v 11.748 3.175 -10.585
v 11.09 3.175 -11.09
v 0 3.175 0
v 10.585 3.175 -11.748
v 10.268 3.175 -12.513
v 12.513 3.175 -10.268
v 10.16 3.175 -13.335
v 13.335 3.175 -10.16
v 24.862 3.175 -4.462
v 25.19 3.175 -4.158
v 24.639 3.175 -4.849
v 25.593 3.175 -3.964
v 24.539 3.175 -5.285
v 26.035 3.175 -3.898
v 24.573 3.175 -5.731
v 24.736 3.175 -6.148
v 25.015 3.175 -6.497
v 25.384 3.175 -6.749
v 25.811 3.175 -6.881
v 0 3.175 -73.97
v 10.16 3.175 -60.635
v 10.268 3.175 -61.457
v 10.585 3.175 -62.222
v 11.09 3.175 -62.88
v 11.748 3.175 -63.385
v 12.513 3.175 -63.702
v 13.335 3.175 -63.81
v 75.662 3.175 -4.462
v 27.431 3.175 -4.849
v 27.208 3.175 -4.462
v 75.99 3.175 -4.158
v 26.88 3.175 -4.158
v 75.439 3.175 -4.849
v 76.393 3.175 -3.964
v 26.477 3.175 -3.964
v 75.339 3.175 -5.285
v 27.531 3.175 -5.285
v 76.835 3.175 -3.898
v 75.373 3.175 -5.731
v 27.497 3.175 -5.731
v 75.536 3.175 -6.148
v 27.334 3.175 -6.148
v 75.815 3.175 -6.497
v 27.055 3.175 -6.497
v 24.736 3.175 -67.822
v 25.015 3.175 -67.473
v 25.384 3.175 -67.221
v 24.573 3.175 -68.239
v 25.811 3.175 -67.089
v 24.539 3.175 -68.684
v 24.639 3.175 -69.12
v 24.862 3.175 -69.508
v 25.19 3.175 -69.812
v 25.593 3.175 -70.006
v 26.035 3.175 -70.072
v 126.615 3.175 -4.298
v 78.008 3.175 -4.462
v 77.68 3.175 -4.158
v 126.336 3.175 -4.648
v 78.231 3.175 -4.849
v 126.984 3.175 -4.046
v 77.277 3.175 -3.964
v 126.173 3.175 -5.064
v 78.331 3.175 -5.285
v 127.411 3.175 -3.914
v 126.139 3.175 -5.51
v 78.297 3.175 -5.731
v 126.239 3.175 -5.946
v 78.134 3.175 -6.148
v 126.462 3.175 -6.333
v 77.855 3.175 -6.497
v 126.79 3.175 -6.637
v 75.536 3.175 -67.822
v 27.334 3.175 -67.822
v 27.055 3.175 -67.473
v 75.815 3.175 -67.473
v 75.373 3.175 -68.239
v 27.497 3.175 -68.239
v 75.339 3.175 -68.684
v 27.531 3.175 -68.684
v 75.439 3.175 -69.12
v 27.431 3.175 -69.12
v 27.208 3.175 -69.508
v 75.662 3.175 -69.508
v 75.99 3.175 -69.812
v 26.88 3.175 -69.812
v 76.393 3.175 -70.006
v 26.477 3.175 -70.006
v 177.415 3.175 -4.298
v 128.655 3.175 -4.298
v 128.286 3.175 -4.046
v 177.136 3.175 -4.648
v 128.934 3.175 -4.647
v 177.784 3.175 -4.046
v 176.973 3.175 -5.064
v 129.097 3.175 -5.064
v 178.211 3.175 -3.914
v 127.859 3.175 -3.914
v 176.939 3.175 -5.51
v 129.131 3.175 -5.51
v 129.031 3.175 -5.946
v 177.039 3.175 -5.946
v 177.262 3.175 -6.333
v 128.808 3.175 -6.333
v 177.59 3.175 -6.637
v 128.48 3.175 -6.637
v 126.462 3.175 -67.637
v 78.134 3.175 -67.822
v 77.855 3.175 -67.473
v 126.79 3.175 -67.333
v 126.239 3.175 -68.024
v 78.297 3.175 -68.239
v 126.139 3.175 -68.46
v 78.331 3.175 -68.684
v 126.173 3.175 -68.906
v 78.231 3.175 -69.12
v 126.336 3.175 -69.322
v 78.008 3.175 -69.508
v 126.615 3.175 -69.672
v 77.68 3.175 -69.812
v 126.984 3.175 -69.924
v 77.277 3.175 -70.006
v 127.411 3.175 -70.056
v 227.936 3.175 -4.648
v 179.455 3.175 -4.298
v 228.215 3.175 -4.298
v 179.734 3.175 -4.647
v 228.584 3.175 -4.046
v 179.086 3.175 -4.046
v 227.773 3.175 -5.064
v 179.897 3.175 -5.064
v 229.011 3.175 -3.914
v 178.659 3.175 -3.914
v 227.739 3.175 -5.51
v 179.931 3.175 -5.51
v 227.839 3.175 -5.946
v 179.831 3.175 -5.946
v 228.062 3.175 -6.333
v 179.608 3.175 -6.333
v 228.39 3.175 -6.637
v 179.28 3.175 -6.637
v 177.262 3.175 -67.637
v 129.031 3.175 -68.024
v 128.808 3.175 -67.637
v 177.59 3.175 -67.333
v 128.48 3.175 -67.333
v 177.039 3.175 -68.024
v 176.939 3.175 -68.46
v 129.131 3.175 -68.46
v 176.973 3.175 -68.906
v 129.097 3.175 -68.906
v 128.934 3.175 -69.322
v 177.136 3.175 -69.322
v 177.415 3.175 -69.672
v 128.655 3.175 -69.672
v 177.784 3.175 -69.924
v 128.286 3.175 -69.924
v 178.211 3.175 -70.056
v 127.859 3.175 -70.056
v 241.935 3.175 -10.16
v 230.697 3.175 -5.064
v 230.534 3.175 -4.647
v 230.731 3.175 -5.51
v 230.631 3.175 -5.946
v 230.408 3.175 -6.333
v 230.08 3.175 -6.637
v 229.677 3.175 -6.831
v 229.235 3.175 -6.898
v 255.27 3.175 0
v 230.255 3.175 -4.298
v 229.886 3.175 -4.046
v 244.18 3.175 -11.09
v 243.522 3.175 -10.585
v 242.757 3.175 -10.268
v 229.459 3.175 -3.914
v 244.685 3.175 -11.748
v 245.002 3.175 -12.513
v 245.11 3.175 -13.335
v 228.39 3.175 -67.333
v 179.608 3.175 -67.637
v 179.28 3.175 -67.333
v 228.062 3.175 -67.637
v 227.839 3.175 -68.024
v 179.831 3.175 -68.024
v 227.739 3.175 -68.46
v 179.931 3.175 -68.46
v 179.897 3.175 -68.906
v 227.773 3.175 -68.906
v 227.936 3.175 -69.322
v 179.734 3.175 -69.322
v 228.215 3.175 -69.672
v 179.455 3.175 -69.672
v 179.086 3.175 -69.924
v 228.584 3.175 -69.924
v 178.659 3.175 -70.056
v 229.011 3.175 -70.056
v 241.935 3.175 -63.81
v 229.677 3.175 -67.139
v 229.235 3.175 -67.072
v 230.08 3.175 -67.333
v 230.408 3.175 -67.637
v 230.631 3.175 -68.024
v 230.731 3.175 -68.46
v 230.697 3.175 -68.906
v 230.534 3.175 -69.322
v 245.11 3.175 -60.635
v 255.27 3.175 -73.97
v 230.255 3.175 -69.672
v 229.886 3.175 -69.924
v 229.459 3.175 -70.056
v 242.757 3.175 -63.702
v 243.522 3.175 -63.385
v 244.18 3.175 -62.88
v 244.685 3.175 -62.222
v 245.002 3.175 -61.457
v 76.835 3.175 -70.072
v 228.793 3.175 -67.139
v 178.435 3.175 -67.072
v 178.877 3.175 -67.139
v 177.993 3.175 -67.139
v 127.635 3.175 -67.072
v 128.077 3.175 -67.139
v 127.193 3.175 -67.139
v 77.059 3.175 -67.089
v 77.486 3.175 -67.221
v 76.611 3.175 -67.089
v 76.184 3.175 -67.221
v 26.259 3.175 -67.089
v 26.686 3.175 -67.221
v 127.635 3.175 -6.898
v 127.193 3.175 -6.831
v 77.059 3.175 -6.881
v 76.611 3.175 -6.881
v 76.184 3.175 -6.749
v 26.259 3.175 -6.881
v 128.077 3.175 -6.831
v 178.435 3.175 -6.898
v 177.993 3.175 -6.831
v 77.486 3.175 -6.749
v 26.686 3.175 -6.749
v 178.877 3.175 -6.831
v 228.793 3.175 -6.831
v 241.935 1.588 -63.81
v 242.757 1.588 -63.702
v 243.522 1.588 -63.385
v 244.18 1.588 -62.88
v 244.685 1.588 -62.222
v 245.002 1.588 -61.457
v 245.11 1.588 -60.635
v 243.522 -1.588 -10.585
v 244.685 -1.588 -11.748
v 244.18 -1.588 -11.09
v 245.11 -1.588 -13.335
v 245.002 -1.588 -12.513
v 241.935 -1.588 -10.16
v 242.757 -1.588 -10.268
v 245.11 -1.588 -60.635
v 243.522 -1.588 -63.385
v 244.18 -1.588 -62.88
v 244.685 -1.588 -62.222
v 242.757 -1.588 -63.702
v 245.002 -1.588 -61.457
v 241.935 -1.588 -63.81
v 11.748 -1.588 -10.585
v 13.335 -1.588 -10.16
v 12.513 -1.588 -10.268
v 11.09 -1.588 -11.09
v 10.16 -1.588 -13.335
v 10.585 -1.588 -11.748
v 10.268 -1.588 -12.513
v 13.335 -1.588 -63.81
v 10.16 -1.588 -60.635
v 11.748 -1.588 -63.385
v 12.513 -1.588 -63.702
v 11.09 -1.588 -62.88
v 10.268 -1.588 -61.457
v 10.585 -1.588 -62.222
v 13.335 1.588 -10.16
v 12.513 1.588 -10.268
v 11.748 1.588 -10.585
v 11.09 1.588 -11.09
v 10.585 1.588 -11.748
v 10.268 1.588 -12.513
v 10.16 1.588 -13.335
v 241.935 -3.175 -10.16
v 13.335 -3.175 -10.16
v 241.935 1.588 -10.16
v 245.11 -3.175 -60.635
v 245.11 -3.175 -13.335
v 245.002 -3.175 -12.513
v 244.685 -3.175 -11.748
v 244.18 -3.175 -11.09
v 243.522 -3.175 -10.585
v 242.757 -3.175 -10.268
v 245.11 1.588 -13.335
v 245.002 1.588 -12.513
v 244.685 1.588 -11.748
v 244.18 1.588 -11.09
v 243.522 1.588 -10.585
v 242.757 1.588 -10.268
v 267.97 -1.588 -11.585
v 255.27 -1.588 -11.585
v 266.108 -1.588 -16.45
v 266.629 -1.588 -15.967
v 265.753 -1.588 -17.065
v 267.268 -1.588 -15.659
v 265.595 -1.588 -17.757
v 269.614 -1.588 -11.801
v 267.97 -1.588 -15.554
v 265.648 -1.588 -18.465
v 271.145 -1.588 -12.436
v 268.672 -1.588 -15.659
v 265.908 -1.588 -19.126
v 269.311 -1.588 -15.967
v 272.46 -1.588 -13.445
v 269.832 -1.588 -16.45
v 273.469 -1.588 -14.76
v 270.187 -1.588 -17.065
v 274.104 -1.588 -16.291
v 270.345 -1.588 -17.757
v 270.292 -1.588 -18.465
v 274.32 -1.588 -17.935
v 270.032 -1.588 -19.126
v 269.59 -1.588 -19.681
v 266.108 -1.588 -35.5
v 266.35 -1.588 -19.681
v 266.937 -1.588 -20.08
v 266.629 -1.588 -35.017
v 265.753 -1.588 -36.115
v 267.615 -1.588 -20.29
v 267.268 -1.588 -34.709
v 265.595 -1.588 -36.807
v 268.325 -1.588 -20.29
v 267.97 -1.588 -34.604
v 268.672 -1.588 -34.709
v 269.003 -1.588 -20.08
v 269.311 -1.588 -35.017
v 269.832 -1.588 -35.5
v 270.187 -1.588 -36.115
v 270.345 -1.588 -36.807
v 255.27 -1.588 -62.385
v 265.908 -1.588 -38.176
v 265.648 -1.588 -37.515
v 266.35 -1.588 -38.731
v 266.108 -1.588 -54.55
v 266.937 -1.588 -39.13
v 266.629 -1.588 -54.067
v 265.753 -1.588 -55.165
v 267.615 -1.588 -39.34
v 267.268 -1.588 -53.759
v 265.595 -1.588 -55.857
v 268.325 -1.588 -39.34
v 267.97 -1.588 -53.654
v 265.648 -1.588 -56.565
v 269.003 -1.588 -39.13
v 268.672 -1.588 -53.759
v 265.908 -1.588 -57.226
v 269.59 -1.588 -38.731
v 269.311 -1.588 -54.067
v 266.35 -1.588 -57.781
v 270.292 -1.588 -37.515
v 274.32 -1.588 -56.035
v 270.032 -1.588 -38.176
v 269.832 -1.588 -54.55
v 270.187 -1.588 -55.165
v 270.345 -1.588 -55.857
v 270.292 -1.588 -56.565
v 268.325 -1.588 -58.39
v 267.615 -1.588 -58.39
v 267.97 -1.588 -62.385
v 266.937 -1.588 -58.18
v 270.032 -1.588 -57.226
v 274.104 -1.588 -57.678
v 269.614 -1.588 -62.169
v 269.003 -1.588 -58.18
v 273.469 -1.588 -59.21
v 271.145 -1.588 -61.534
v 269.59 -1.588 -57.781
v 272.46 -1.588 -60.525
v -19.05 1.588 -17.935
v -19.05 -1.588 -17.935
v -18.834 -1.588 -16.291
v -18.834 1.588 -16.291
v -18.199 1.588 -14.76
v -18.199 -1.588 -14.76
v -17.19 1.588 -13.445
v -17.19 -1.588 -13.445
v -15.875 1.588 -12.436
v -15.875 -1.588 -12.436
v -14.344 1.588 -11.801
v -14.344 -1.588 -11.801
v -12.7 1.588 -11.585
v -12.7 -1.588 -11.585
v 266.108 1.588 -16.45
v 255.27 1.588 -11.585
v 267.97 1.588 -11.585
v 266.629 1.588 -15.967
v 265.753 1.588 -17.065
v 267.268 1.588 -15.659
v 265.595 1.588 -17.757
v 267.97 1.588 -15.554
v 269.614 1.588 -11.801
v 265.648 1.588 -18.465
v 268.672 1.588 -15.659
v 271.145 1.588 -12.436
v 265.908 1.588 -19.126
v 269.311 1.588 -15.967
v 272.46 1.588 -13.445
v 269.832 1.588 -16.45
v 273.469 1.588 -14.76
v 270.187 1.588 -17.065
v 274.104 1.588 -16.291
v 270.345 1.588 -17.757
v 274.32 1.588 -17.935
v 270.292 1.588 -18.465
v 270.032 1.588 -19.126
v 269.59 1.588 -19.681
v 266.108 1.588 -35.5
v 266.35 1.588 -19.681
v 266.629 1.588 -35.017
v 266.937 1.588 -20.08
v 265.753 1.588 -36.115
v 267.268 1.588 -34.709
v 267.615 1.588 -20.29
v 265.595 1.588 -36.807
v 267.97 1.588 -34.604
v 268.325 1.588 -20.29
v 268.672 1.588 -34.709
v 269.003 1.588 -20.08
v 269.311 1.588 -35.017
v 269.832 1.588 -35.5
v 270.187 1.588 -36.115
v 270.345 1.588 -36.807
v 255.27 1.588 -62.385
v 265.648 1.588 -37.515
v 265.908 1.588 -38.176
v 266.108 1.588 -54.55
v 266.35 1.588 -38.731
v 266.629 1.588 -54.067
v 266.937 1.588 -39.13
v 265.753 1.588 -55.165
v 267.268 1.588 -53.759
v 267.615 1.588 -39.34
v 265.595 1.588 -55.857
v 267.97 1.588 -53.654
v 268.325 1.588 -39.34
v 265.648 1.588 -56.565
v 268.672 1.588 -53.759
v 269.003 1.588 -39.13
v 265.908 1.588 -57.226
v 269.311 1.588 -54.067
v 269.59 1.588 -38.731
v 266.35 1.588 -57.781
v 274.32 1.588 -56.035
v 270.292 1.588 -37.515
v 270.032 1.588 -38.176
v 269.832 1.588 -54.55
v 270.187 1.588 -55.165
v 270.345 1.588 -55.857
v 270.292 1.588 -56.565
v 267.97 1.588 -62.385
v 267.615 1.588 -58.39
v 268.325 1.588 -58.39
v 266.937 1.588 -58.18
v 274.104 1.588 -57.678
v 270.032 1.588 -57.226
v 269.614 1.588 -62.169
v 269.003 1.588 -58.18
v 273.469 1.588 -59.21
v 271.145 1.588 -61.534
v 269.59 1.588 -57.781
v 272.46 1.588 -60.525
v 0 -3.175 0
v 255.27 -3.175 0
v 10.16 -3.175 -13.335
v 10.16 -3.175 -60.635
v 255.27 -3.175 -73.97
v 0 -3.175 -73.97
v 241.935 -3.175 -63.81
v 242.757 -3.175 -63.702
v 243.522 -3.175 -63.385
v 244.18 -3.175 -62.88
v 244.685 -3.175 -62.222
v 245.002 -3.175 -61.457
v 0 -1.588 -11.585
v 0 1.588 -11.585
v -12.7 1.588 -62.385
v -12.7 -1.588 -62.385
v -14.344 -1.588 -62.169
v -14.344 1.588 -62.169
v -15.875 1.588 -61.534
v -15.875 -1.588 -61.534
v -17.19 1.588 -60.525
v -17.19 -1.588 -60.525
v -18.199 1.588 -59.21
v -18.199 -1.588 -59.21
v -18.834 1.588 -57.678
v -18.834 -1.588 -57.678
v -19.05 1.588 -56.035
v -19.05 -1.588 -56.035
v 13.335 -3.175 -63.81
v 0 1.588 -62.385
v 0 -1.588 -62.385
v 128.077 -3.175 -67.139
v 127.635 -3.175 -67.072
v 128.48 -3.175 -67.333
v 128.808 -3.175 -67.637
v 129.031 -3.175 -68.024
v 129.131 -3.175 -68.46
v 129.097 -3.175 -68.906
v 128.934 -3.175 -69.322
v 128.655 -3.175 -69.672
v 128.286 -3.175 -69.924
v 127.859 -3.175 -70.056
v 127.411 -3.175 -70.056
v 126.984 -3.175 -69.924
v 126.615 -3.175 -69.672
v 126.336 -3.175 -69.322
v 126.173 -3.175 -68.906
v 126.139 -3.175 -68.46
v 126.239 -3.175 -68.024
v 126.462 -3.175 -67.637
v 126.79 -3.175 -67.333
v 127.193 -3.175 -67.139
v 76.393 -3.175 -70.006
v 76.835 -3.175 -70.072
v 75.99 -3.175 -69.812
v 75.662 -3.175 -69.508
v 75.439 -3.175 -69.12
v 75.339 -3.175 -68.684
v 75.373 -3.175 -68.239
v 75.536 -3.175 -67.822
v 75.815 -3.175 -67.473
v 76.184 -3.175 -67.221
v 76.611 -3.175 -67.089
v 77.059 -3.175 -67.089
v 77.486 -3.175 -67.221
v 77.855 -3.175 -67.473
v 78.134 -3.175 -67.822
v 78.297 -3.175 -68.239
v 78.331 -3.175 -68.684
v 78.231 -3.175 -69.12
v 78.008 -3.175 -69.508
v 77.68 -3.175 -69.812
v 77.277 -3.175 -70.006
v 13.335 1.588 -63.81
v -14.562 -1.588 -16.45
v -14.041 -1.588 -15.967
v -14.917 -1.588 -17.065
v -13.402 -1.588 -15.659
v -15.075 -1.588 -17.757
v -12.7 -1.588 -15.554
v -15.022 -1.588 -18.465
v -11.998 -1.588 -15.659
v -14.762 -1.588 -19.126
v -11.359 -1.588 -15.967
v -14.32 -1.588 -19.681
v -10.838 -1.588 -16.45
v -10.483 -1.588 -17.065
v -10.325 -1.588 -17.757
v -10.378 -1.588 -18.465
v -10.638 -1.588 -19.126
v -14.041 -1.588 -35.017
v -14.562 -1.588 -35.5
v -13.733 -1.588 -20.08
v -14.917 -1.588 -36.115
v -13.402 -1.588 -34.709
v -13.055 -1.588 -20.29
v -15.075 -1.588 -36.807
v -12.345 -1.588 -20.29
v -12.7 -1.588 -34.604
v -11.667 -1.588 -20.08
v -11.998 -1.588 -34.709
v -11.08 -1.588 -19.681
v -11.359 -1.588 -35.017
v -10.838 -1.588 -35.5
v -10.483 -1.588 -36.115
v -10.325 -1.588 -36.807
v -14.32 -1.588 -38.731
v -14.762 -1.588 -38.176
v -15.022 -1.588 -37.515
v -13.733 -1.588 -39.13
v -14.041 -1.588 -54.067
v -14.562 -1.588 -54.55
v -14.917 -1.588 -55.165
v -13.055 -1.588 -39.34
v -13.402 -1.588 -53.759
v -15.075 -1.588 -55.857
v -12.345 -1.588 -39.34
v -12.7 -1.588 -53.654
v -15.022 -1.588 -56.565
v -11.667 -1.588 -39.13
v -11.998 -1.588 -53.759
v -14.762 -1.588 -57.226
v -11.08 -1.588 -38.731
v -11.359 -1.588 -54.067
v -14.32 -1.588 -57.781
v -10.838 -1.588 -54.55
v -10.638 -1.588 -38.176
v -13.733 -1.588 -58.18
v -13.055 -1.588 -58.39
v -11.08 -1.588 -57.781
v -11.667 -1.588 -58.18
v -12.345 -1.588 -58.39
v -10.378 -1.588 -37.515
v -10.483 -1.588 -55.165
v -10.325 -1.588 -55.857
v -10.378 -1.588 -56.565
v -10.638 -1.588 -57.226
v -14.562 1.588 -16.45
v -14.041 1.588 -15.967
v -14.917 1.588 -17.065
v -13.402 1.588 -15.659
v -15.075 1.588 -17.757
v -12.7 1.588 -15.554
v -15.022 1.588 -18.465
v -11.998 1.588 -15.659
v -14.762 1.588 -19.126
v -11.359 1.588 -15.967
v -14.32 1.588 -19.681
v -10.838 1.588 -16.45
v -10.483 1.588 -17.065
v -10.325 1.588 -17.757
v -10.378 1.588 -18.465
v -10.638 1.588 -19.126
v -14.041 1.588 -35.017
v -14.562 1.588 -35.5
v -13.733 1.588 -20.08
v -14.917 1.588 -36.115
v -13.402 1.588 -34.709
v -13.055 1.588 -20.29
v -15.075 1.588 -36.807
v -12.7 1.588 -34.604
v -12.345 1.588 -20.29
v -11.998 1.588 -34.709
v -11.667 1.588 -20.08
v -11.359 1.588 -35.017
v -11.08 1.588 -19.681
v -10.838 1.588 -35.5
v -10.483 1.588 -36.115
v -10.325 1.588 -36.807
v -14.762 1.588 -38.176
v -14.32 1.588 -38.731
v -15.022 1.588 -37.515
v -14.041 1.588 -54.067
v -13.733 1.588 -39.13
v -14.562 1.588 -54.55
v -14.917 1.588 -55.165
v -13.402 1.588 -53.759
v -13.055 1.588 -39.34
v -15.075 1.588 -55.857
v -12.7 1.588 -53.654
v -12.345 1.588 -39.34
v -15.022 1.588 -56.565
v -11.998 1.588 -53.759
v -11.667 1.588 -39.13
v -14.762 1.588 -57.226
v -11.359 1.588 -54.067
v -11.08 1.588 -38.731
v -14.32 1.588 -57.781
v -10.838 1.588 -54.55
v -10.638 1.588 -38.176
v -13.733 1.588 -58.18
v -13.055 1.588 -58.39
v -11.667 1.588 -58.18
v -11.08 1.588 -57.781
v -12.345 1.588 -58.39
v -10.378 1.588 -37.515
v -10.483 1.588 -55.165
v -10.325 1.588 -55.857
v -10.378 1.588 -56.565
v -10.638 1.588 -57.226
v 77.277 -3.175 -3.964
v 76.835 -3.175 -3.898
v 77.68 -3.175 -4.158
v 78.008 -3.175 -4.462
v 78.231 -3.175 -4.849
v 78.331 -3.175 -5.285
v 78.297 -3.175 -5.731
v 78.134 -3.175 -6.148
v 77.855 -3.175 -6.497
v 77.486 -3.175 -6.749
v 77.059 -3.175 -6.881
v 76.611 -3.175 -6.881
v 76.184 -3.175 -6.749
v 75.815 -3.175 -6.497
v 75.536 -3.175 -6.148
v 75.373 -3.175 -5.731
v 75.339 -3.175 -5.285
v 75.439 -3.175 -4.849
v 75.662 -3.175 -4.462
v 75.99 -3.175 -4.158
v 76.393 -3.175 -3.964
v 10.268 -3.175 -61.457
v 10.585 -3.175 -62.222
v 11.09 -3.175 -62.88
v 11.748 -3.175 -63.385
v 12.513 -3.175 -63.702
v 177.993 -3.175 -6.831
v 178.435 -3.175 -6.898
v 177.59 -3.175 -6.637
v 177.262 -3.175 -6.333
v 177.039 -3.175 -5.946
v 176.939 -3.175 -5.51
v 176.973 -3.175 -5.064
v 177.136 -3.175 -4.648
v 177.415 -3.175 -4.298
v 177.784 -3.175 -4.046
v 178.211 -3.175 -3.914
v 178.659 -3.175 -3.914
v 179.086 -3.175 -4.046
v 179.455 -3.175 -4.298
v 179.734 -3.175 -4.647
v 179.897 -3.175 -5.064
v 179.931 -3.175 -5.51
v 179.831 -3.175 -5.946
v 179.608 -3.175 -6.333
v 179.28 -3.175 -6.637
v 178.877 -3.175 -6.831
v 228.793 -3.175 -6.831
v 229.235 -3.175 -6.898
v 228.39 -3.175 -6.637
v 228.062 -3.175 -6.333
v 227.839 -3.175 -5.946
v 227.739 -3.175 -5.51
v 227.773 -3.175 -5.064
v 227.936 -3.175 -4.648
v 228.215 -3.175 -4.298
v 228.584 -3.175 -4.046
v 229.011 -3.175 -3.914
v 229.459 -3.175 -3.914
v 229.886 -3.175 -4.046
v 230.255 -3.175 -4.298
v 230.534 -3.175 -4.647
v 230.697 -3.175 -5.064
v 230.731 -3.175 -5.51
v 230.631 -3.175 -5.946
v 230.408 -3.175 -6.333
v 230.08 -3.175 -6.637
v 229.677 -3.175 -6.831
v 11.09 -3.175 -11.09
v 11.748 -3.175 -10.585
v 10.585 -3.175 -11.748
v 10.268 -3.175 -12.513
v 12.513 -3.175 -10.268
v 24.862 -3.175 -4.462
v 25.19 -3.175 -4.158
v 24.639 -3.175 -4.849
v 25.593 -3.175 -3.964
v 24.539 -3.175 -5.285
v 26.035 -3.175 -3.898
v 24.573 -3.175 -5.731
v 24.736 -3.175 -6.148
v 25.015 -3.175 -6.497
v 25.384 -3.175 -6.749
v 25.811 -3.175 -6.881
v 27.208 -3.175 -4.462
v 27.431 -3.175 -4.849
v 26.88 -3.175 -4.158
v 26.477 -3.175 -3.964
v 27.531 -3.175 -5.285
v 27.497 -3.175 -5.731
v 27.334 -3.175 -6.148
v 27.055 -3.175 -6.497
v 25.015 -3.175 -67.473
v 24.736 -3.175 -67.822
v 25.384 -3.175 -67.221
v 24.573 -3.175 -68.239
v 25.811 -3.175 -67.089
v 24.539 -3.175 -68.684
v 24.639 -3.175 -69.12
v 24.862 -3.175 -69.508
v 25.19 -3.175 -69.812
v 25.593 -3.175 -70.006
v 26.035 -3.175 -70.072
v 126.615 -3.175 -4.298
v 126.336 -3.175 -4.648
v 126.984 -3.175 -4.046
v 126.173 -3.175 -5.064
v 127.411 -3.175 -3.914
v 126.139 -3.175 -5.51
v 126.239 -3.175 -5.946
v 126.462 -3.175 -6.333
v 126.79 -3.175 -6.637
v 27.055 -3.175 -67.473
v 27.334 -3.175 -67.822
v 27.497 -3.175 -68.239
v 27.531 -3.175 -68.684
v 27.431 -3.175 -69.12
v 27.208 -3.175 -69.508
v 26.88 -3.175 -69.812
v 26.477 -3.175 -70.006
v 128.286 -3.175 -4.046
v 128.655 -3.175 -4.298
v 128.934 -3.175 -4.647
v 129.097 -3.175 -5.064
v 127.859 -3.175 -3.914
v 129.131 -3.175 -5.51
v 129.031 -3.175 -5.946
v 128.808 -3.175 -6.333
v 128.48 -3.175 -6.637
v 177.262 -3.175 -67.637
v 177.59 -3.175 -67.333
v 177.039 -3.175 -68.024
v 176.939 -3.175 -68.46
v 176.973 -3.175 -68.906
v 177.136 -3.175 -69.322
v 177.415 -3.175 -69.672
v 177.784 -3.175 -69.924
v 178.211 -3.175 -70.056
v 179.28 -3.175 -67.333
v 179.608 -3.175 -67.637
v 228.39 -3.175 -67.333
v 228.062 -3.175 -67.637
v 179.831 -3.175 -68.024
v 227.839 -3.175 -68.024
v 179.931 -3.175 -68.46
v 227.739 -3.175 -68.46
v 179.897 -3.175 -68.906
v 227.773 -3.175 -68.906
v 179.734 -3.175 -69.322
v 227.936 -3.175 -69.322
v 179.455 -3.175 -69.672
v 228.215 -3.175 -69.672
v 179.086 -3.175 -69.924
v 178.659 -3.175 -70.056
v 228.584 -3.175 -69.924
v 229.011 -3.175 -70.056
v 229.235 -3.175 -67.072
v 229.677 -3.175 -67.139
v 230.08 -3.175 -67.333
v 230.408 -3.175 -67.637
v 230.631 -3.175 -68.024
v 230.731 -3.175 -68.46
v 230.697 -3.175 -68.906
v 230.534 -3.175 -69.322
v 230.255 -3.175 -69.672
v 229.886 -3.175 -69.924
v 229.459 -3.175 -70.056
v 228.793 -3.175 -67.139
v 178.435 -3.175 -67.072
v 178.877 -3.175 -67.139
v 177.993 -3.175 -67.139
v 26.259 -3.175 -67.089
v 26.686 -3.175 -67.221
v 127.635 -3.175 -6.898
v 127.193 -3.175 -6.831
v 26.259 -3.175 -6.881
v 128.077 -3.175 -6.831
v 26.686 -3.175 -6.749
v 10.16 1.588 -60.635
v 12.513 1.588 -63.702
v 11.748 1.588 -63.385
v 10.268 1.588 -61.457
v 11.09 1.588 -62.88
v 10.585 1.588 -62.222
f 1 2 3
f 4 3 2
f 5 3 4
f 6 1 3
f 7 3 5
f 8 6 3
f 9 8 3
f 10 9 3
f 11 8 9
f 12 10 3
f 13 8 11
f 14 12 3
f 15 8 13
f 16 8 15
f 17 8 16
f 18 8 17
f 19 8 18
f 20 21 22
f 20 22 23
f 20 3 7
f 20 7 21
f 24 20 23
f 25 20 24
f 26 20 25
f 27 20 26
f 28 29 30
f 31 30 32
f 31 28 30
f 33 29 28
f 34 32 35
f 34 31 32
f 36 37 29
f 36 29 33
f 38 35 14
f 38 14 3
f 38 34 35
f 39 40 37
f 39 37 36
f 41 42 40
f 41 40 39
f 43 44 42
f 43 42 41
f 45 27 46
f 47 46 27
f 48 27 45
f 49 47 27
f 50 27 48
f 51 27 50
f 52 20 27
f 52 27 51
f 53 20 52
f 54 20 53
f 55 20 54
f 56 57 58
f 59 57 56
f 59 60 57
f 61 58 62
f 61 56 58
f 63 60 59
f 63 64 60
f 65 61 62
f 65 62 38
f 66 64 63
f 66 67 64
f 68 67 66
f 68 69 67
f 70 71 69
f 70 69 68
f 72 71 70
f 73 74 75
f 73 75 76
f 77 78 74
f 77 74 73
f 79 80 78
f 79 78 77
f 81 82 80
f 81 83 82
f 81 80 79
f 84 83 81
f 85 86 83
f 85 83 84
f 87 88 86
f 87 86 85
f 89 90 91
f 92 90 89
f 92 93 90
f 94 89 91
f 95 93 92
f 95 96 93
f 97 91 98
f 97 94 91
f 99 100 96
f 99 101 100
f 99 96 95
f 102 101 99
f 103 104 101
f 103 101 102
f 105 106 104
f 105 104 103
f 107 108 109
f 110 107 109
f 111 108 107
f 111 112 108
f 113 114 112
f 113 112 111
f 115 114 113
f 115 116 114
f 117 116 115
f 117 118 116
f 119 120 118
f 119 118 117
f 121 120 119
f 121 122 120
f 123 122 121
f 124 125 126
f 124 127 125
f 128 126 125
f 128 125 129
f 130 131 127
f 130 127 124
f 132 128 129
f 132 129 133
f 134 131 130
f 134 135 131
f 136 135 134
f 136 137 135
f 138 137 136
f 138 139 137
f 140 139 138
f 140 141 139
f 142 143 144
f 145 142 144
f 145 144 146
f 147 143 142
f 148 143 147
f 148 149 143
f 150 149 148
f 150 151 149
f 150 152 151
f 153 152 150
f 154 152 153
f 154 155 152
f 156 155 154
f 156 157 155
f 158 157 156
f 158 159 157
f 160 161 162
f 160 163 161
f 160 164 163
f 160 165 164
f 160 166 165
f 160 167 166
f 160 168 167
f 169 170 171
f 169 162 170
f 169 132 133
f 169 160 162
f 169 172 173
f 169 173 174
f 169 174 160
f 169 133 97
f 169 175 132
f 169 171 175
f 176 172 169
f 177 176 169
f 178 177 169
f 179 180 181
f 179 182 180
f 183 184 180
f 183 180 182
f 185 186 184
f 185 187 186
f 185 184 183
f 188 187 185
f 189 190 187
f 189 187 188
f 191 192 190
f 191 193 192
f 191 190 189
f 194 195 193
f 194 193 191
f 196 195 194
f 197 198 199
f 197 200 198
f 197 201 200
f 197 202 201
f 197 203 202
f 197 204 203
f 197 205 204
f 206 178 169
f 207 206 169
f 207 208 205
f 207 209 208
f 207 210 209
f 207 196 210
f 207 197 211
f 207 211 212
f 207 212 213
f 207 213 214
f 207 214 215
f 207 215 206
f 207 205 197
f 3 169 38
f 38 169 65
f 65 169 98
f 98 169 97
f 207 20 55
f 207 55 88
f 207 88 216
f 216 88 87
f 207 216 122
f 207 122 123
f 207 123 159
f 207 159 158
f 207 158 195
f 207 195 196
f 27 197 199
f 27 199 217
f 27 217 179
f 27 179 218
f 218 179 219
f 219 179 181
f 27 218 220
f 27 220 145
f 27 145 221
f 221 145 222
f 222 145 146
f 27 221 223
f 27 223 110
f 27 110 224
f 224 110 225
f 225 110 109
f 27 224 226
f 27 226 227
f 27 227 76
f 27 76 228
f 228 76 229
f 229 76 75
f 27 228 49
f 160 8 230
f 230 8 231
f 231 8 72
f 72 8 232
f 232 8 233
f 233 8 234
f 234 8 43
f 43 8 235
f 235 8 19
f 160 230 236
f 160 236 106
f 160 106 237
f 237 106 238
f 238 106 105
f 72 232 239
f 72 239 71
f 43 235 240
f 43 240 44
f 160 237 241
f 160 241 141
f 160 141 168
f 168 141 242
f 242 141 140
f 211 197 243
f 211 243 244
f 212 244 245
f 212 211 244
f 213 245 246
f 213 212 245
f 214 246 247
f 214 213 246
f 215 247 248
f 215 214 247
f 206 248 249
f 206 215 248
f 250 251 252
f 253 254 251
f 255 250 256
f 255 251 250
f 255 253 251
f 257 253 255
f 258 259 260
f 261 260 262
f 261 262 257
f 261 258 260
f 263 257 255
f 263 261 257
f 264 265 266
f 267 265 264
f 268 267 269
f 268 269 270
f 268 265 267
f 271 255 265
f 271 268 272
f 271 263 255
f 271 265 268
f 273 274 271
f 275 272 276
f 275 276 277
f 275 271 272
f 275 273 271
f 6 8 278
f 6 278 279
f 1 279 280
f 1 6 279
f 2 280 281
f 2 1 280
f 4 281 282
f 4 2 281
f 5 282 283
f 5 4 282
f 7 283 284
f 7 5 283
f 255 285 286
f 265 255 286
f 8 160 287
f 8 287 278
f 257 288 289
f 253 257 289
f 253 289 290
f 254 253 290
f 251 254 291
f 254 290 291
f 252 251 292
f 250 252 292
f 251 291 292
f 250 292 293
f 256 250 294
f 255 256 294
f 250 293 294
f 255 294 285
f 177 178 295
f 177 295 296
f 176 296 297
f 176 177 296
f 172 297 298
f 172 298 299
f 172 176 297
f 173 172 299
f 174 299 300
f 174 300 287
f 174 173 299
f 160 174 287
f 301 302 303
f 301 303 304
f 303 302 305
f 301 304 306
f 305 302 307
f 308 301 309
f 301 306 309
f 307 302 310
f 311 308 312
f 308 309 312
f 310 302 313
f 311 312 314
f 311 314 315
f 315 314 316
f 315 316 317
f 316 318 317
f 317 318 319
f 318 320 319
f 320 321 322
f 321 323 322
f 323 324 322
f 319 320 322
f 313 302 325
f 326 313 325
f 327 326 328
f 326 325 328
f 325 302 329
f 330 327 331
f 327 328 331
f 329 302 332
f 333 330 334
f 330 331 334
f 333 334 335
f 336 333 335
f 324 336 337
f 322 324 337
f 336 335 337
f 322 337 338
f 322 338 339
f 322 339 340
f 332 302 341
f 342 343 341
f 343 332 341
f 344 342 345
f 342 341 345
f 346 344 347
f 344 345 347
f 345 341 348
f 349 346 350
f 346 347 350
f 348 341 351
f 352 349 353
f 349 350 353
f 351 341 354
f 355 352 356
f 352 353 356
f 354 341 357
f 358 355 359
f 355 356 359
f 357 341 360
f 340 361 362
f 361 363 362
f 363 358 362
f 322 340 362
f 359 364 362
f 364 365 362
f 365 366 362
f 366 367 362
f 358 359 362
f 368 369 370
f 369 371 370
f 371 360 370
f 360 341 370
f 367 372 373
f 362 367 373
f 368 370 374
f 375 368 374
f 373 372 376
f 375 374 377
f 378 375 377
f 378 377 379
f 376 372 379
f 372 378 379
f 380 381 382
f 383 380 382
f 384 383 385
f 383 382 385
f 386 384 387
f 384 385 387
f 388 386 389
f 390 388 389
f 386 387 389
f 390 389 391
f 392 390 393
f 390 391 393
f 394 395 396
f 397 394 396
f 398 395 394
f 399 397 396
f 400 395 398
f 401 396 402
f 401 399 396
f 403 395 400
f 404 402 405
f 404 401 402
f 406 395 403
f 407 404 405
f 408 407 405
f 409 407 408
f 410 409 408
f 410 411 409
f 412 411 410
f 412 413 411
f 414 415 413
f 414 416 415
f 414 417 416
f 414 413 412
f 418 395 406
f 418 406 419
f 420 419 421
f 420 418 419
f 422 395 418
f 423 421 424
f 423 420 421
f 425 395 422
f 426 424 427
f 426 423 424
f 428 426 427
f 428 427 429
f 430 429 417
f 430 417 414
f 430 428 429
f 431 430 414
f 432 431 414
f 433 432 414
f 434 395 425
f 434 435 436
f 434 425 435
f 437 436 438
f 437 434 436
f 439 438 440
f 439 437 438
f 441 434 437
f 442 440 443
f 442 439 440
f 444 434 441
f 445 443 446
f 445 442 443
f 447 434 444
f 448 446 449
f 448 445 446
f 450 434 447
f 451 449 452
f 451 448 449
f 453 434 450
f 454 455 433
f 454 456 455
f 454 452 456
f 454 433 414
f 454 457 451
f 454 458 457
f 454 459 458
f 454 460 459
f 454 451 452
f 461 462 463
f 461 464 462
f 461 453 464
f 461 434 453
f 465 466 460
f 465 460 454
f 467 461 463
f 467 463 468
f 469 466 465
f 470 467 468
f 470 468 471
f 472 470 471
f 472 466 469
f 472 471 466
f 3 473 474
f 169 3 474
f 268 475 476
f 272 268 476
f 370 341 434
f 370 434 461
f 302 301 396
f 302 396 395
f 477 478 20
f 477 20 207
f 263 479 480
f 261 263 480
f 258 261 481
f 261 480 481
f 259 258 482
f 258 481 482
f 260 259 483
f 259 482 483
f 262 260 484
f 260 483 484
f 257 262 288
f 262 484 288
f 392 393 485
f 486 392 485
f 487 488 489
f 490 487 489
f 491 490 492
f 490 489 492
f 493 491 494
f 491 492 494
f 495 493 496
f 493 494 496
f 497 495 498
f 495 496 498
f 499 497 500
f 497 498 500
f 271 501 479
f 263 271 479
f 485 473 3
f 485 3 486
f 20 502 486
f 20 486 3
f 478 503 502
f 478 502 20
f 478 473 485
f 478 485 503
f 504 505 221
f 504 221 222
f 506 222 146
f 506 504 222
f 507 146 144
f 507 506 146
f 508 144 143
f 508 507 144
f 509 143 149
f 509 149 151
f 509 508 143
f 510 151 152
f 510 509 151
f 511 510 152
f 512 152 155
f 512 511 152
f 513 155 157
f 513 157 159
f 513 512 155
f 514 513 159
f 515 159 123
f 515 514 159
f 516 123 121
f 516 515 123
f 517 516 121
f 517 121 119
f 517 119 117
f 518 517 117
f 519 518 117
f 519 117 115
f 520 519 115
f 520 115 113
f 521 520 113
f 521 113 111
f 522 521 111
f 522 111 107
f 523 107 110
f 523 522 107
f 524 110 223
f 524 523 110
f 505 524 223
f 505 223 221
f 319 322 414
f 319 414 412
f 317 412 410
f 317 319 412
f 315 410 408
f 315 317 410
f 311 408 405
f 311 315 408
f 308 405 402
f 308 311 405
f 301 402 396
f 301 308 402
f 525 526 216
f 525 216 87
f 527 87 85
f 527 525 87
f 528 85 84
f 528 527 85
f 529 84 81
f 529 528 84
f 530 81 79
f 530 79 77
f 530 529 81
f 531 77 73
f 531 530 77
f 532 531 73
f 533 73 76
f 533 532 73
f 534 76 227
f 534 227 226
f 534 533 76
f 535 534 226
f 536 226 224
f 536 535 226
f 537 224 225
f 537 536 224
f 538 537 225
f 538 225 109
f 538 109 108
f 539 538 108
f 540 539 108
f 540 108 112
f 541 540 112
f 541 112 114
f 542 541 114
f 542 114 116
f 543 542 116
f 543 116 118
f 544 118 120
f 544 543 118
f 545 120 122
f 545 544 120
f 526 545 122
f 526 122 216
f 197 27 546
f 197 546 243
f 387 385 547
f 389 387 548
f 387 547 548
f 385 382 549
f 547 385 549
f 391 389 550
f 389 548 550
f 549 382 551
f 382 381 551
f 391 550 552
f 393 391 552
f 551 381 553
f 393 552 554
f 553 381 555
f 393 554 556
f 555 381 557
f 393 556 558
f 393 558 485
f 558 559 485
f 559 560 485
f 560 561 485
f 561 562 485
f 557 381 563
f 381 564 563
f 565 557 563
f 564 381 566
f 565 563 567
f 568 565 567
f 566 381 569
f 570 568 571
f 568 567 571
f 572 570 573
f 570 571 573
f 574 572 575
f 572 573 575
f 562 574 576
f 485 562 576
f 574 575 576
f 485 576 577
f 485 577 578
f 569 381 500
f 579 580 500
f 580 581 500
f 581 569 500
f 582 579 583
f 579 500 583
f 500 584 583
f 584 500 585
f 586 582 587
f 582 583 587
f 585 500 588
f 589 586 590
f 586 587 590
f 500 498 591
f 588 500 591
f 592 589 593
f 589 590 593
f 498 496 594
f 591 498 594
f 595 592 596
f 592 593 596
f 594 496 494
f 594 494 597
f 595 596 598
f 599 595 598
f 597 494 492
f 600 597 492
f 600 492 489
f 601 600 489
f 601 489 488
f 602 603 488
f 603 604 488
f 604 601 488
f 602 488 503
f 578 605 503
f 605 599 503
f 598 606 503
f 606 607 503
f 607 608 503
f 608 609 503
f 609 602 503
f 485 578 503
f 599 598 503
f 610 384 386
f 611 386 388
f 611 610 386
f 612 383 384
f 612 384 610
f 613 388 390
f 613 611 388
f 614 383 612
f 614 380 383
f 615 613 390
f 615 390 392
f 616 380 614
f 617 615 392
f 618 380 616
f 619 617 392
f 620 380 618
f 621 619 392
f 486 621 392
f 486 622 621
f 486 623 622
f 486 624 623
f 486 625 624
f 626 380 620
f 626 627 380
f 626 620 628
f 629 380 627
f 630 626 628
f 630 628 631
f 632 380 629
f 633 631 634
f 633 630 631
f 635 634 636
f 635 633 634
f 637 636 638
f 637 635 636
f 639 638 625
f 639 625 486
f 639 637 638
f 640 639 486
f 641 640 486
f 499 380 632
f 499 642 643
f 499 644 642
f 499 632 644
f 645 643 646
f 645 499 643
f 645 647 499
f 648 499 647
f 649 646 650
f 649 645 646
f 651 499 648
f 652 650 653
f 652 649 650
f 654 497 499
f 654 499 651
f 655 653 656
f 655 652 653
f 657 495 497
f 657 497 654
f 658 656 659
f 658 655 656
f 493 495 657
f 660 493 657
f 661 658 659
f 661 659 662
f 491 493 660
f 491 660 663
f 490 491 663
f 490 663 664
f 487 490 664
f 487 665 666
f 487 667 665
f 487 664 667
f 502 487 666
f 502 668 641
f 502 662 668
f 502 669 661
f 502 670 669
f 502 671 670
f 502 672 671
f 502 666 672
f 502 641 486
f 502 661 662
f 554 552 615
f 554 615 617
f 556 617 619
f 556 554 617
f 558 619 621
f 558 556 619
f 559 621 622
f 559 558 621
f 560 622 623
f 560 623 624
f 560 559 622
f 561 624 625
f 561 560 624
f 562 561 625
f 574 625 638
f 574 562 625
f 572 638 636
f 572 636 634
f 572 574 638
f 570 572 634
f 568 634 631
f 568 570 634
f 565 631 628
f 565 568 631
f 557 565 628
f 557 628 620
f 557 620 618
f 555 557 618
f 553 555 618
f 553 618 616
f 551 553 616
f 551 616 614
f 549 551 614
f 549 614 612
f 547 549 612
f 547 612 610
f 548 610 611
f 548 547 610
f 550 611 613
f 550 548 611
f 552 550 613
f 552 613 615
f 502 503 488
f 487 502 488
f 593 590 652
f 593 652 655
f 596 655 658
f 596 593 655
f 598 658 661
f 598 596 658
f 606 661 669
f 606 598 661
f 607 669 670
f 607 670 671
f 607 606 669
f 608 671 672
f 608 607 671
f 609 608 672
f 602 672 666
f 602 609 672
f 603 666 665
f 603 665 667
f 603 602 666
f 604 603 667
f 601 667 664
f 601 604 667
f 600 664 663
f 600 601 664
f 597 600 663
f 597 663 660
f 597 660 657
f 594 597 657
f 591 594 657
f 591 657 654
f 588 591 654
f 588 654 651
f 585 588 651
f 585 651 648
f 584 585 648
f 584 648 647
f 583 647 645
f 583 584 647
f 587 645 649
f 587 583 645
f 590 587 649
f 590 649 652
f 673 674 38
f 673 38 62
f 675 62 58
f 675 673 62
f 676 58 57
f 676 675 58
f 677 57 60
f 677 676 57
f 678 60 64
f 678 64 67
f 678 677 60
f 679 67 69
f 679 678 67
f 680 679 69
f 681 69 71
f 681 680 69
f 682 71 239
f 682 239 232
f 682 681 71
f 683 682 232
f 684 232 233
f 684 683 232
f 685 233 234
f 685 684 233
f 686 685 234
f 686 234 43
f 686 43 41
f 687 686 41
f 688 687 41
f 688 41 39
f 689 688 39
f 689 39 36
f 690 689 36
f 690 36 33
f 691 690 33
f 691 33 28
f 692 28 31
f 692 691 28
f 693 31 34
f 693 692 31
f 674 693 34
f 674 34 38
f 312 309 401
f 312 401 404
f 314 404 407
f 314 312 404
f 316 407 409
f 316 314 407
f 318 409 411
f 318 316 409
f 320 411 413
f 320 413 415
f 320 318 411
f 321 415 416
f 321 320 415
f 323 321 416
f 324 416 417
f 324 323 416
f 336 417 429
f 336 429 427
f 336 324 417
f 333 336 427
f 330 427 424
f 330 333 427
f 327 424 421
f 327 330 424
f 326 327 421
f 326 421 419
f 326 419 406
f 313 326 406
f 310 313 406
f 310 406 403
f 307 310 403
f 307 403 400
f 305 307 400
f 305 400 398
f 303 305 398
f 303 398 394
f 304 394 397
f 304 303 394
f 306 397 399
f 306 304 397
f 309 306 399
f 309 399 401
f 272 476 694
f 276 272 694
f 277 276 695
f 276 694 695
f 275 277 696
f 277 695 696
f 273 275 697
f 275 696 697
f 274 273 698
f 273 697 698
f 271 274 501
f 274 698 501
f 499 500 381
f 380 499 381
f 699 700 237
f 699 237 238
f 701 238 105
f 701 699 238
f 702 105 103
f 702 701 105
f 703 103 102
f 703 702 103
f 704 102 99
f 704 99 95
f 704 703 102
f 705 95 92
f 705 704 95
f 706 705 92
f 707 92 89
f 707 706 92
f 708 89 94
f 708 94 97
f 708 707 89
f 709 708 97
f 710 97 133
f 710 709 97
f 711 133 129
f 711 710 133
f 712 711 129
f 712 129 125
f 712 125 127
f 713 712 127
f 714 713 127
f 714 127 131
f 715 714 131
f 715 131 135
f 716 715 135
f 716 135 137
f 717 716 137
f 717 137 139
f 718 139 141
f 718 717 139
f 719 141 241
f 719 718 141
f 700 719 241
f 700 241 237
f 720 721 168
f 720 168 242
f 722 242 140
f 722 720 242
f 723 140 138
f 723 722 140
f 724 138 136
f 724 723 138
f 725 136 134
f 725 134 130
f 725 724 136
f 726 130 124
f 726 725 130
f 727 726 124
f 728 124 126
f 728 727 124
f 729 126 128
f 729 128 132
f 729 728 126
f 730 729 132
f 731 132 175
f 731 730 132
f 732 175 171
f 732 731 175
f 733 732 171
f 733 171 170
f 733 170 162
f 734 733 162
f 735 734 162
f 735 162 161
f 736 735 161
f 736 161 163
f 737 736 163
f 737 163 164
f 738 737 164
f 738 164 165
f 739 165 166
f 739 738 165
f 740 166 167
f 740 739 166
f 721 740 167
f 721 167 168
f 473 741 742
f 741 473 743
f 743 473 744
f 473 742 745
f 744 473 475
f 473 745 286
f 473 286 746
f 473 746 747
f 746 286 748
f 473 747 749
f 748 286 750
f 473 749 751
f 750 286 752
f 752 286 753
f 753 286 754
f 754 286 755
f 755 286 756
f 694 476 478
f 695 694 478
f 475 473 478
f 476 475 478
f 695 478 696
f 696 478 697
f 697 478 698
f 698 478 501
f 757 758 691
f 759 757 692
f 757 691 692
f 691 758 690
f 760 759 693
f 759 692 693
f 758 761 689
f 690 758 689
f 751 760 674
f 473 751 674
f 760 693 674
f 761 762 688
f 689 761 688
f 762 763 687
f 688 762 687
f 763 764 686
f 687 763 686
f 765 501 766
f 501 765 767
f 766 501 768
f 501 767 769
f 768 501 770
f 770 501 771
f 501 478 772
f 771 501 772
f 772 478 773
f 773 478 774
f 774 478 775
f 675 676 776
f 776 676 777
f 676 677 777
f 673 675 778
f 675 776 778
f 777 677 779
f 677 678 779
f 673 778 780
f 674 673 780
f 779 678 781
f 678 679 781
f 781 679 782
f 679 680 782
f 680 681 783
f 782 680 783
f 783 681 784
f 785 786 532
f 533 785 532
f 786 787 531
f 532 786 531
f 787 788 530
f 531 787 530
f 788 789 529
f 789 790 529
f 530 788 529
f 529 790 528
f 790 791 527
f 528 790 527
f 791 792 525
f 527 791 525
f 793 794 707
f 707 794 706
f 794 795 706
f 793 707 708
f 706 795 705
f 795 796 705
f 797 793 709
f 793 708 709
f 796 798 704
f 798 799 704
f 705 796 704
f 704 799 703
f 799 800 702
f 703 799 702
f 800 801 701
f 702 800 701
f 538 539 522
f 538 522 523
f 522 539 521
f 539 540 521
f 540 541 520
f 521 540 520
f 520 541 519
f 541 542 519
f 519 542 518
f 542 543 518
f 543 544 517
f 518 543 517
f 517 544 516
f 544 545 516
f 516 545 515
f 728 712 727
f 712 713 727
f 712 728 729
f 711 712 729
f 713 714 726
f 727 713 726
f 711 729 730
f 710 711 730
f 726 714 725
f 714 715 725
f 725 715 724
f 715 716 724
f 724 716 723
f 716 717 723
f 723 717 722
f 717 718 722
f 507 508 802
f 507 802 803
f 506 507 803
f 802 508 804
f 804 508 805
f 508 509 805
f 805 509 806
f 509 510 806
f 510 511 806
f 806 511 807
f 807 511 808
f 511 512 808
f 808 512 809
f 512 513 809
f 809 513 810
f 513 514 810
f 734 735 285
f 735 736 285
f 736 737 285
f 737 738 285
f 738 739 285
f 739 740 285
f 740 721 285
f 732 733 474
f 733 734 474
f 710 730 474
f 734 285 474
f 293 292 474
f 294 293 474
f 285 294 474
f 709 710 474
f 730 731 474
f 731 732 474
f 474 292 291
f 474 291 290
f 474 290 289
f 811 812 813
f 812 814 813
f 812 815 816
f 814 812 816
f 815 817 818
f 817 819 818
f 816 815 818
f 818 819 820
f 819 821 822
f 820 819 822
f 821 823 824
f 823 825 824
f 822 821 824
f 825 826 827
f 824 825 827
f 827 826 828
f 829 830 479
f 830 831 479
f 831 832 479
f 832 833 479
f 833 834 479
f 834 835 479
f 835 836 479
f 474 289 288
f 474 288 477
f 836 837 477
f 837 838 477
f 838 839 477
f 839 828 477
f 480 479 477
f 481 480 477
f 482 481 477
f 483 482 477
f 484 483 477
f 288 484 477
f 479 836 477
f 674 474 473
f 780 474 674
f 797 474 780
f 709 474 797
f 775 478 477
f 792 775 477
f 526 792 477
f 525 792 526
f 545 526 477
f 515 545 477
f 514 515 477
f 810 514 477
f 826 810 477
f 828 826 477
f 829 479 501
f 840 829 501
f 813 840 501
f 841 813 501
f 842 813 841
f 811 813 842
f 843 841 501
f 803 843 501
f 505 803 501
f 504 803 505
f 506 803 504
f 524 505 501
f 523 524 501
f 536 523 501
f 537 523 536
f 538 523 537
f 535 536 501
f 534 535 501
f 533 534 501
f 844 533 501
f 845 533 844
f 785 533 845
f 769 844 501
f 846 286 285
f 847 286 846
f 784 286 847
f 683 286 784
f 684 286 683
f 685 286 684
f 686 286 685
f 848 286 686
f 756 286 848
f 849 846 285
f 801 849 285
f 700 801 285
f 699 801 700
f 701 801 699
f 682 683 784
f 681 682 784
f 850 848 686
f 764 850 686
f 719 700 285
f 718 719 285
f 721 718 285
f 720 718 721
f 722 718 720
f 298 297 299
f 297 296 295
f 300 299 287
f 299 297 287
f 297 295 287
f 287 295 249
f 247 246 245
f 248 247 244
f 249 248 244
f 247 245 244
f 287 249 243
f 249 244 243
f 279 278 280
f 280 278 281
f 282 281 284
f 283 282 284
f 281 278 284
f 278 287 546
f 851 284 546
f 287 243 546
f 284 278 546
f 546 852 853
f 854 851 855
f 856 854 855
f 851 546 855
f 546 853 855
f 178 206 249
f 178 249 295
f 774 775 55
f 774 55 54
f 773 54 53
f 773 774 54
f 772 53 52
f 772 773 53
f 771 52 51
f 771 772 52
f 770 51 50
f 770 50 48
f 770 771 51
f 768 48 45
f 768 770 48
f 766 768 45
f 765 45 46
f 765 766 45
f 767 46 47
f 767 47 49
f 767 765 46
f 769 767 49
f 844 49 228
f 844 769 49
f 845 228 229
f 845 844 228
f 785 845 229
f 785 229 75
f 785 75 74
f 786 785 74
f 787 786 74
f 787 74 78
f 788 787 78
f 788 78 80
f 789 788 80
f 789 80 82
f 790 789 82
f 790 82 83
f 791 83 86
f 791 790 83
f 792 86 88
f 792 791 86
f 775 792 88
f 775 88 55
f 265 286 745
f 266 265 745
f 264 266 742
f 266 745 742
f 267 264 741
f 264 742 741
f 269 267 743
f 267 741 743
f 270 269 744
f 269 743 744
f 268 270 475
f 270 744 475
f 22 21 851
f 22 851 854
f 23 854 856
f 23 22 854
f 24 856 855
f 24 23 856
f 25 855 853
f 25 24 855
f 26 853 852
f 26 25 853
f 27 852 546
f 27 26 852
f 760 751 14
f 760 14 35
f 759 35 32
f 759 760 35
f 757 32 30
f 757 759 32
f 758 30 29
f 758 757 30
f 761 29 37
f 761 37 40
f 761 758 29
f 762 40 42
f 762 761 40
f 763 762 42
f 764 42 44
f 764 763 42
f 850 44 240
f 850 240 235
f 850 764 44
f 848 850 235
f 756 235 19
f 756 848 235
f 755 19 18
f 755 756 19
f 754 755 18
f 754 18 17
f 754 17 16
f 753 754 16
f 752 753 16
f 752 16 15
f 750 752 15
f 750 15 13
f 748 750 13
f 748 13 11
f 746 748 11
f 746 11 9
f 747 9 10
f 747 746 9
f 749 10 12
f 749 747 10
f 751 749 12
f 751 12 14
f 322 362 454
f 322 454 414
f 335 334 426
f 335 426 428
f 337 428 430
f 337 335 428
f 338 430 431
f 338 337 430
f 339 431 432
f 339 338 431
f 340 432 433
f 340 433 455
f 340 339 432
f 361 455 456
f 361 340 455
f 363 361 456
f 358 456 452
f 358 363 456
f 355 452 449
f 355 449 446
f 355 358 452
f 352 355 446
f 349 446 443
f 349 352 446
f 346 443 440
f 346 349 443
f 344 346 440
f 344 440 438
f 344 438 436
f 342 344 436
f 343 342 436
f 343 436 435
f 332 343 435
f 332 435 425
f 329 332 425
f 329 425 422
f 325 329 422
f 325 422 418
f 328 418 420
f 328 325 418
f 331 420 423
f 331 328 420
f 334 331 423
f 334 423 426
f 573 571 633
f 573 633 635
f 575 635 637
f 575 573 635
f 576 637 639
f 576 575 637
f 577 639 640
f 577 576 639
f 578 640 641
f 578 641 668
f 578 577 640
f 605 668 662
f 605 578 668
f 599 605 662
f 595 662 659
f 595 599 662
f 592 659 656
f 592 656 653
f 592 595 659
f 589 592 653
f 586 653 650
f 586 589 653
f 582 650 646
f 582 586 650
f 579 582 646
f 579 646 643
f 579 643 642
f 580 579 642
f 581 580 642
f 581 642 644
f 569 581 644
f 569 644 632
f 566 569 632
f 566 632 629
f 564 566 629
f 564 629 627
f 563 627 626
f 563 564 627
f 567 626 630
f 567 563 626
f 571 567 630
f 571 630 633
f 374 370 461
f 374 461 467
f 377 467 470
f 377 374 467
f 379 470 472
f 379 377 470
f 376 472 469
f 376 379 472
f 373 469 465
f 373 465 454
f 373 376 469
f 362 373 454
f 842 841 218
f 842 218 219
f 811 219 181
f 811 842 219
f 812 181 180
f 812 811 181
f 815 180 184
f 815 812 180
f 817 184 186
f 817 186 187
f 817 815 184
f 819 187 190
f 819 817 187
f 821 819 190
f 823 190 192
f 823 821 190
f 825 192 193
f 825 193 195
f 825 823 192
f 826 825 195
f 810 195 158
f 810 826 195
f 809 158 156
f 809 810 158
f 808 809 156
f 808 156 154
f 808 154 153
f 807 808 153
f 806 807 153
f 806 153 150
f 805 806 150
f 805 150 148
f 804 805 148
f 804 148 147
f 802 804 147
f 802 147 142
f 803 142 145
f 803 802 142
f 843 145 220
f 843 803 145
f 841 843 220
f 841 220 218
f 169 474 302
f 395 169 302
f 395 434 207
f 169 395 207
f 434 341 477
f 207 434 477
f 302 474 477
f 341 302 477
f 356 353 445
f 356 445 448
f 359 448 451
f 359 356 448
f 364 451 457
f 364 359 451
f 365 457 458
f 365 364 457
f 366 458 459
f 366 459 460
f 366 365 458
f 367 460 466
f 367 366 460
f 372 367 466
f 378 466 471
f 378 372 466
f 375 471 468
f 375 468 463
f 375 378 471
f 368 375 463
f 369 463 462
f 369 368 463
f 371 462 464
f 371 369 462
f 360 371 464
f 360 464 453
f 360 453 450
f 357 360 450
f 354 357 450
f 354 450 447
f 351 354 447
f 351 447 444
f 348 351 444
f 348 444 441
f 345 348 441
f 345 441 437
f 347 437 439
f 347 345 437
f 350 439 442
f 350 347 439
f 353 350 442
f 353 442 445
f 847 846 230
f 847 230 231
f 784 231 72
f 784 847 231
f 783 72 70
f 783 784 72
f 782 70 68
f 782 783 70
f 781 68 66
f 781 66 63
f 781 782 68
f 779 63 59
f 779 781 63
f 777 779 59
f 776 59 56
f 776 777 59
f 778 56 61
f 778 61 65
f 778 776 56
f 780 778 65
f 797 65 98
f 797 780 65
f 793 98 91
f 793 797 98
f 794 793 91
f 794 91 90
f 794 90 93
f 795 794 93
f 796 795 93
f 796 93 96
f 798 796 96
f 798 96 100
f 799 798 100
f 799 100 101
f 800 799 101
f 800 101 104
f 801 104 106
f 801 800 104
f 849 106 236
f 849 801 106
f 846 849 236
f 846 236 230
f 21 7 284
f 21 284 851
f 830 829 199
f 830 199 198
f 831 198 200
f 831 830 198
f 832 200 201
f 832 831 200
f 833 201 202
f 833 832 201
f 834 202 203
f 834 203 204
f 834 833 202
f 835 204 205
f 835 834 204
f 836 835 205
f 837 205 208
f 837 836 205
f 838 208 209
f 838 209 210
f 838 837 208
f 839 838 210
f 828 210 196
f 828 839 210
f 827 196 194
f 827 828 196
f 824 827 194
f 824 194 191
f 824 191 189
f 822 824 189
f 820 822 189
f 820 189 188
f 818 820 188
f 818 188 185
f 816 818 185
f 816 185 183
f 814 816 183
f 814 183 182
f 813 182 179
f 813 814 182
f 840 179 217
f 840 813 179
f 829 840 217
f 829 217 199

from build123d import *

# Parameters (mm, degrees)
BOSS_EXTRUDE1_DEPTH      = 1.5875
BOSS_EXTRUDE1_DEPTH_BACK = 1.5875
SKETCH1_R                = 1.5
SKETCH1_R_2              = 2.38125
BOSS_EXTRUDE2_DEPTH      = 3.175
BOSS_EXTRUDE2_DEPTH_BACK = 3.175
SKETCH1_4_W              = 255.27
SKETCH1_4_H              = 73.96988
CUT_EXTRUDE1_DEPTH       = 1.5875
CUT_EXTRUDE2_DEPTH       = 3.175
CUT_EXTRUDE2_DEPTH_BACK  = 3.175
SKETCH1_6_R              = 1.5


with BuildPart() as part:
    # Sketch1 → Boss-Extrude1 (new, two sides: drawn at the far end of the back side and taken through both)
    with BuildSketch(Plane(origin=(0, 0, 0), x_dir=(1, 0, 0), z_dir=(0, 1, 0)).offset(-BOSS_EXTRUDE1_DEPTH_BACK)):
        with BuildLine():
            Line((0, 11.58494), (0, 0))
            Line((0, 0), (255.27, 0))
            Line((255.27, 0), (255.27, 11.58494))
            Line((255.27, 11.58494), (267.97, 11.58494))
            ThreePointArc((267.97, 11.58494), (272.460128061, 13.444811939), (274.32, 17.93494))
            Line((274.32, 17.93494), (274.32, 56.03494))
            ThreePointArc((274.32, 56.03494), (272.460128061, 60.525068061), (267.97, 62.38494))
            Line((267.97, 62.38494), (255.27, 62.38494))
            Line((255.27, 62.38494), (255.27, 73.96988))
            Line((255.27, 73.96988), (0, 73.96988))
            Line((0, 73.96988), (0, 62.38494))
            Line((0, 62.38494), (-12.7, 62.38494))
            ThreePointArc((-12.7, 62.38494), (-17.190128061, 60.525068061), (-19.05, 56.03494))
            Line((-19.05, 56.03494), (-19.05, 17.93494))
            ThreePointArc((-19.05, 17.93494), (-17.190128061, 13.444811939), (-12.7, 11.58494))
            Line((-12.7, 11.58494), (0, 11.58494))
        make_face()
        with Locations((26.035, 5.3975)):
            Circle(SKETCH1_R, mode=Mode.SUBTRACT)
        with Locations((76.835, 5.3975)):
            Circle(SKETCH1_R, mode=Mode.SUBTRACT)
        with Locations((127.635, 5.3975)):
            Circle(SKETCH1_R, mode=Mode.SUBTRACT)
        with Locations((178.435, 5.3975)):
            Circle(SKETCH1_R, mode=Mode.SUBTRACT)
        with Locations((229.235, 5.3975)):
            Circle(SKETCH1_R, mode=Mode.SUBTRACT)
        with Locations((26.035, 68.57238)):
            Circle(SKETCH1_R, mode=Mode.SUBTRACT)
        with Locations((76.835, 68.57238)):
            Circle(SKETCH1_R, mode=Mode.SUBTRACT)
        with Locations((127.635, 68.57238)):
            Circle(SKETCH1_R, mode=Mode.SUBTRACT)
        with Locations((178.435, 68.57238)):
            Circle(SKETCH1_R, mode=Mode.SUBTRACT)
        with Locations((229.235, 68.57238)):
            Circle(SKETCH1_R, mode=Mode.SUBTRACT)
        with Locations((-12.7, 56.03494)):
            Circle(SKETCH1_R_2, mode=Mode.SUBTRACT)
        with Locations((-12.7, 17.93494)):
            Circle(SKETCH1_R_2, mode=Mode.SUBTRACT)
        with Locations((-12.7, 36.98494)):
            Circle(SKETCH1_R_2, mode=Mode.SUBTRACT)
        with Locations((267.97, 56.03494)):
            Circle(SKETCH1_R_2, mode=Mode.SUBTRACT)
        with Locations((267.97, 17.93494)):
            Circle(SKETCH1_R_2, mode=Mode.SUBTRACT)
        with Locations((267.97, 36.98494)):
            Circle(SKETCH1_R_2, mode=Mode.SUBTRACT)
    extrude(amount=BOSS_EXTRUDE1_DEPTH + BOSS_EXTRUDE1_DEPTH_BACK)

    # Sketch1<4> → Boss-Extrude2 (add, two sides: drawn at the far end of the back side and taken through both)
    with BuildSketch(Plane(origin=(0, 0, 0), x_dir=(1, 0, 0), z_dir=(0, 1, 0)).offset(-BOSS_EXTRUDE2_DEPTH_BACK)):
        with Locations((127.635, 36.98494)):
            Rectangle(SKETCH1_4_W, SKETCH1_4_H)
    extrude(amount=BOSS_EXTRUDE2_DEPTH + BOSS_EXTRUDE2_DEPTH_BACK)

    # Sketch2 → Cut-Extrude1 (cut)
    with BuildSketch(Plane(origin=(0, 3.175, 0), x_dir=(1, 0, 0), z_dir=(0, 1, 0))):
        with BuildLine():
            Line((13.335, 63.80988), (241.935, 63.80988))
            ThreePointArc((241.935, 63.80988), (244.18006403, 62.87994403), (245.11, 60.63488))
            Line((245.11, 60.63488), (245.11, 13.335))
            ThreePointArc((245.11, 13.335), (244.18006403, 11.08993597), (241.935, 10.16))
            Line((241.935, 10.16), (13.335, 10.16))
            ThreePointArc((13.335, 10.16), (11.08993597, 11.08993597), (10.16, 13.335))
            Line((10.16, 13.335), (10.16, 60.63488))
            ThreePointArc((10.16, 60.63488), (11.08993597, 62.87994403), (13.335, 63.80988))
        make_face()
    cut_extrude1 = extrude(amount=-CUT_EXTRUDE1_DEPTH, mode=Mode.SUBTRACT)

    # Mirror1: Cut-Extrude1 across plane
    add(cut_extrude1.mirror(Plane.ZX), mode=Mode.SUBTRACT)

    # Sketch1<6> → Cut-Extrude2 (cut, two sides: drawn at the far end of the back side and taken through both)
    with BuildSketch(Plane(origin=(0, 0, 0), x_dir=(1, 0, 0), z_dir=(0, 1, 0)).offset(-CUT_EXTRUDE2_DEPTH_BACK)):
        with Locations((178.435, 68.57238)):
            Circle(SKETCH1_6_R)
        with Locations((178.435, 5.3975)):
            Circle(SKETCH1_6_R)
        with Locations((229.235, 68.57238)):
            Circle(SKETCH1_6_R)
        with Locations((229.235, 5.3975)):
            Circle(SKETCH1_6_R)
        with Locations((127.635, 68.57238)):
            Circle(SKETCH1_6_R)
        with Locations((127.635, 5.3975)):
            Circle(SKETCH1_6_R)
        with Locations((26.035, 5.3975)):
            Circle(SKETCH1_6_R)
        with Locations((76.835, 5.3975)):
            Circle(SKETCH1_6_R)
        with Locations((26.035, 68.57238)):
            Circle(SKETCH1_6_R)
        with Locations((76.835, 68.57238)):
            Circle(SKETCH1_6_R)
    extrude(amount=CUT_EXTRUDE2_DEPTH + CUT_EXTRUDE2_DEPTH_BACK, mode=Mode.SUBTRACT)


solid = part.part
